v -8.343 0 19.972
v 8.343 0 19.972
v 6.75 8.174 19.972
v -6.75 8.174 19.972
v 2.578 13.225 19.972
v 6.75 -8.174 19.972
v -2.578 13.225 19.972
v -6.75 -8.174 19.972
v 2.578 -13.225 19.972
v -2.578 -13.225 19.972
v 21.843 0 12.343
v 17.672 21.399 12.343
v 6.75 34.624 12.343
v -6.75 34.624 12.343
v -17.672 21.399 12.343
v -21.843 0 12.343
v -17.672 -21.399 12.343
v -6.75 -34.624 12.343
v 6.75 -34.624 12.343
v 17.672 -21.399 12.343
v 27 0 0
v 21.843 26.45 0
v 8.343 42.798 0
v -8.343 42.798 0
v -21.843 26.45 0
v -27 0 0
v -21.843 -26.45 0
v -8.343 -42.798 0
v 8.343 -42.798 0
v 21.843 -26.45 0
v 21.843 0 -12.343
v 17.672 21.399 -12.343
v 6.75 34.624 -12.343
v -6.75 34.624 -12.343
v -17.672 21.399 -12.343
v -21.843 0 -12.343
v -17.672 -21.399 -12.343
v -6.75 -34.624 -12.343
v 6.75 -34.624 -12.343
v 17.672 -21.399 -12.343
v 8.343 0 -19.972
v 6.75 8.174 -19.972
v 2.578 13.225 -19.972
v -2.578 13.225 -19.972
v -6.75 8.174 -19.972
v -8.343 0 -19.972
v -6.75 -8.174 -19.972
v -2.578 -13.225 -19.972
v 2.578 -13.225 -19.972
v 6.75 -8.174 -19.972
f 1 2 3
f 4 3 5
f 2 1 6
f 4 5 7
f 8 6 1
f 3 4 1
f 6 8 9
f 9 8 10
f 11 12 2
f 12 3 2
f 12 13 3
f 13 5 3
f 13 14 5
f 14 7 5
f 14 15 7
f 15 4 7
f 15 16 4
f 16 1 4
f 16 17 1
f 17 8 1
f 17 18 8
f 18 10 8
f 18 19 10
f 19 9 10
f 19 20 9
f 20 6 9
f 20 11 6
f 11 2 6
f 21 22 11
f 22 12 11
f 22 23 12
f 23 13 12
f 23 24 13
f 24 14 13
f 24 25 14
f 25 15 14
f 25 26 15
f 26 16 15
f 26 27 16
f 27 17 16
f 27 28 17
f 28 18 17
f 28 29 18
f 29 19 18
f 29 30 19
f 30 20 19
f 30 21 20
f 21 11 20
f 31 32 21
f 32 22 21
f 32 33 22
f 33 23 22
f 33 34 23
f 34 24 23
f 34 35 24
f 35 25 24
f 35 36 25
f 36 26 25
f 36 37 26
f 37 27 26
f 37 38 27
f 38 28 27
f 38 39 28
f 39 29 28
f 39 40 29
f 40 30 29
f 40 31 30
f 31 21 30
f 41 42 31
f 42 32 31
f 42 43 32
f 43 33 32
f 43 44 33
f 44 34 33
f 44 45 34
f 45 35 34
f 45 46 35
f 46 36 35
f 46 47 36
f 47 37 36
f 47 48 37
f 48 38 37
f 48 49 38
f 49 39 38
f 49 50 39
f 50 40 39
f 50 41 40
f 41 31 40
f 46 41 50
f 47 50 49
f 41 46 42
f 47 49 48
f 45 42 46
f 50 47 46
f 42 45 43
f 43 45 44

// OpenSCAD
// Generated by SolidPython 1.0.1 on 2020-07-29 00:46:49


scale(v = [9, 15, 7]) {
	sphere(r = 3);
}
/***********************************************
*********      SolidPython code:      **********
************************************************
 
# import packages: SolidPython
from solid import *
from solid.utils import *
from itertools import chain, combinations, permutations


class Resize:

    def __init__(self, scad_file):
        self.scad_file = scad_file
        #self.scad_file = import_scad(scad_file)
        # cone/cylinder param:
        self.r1 = 0
        self.r2 = 0
        self.h = 0
        # rectangular prism param:
        self.w = 0
        self.l = 0
        # ellipse param:
        self.r = 0

    # import OpenScad code (file name corresponds to shape)


    # classify shape + parameters
    def assign(self, param1, param2, param3):
        if self.scad_file == 'cone.scad':
            self.r1 = param1
            self.r2 = param2
            self.h = param3
        elif self.scad_file == 'cylinder.scad':
            self.r1 = param1
            self.r2 = param2
            self.h = param3
        elif self.scad_file == 'rectangularPrism.scad':
            self.h = param1
            self.l = param2
            self.w = param3
        else:
            self.r = param1
            self.h = param2

    # resize parameters
    def iterate(self):
        x = range(3, 20, 2)
        i = 1
        if self.scad_file == 'cone.scad':
            tempList = list(permutations(x, 2))
            for temp in tempList:
                param1 = temp[0]
                param2 = temp[1]
                filepath = 'produced_scad_files/' + 'cone' + str(param1) + '_' + str(param2) + '_' + '.scad'
                scad_render_to_file(cylinder(h=param1, r1=param2, r2=0), filepath)

        elif self.scad_file == 'cylinder.scad':
            tempList = list(permutations(x, 3))
            for temp in tempList:
                param1 = temp[0]
                param2 = temp[1]
                filepath = 'produced_scad_files/' + 'cylinder' + str(param1) + '_' + str(param2) + '_' + '.scad'
                scad_render_to_file(cylinder(h=param1, r1=param2, r2=param2), filepath)

        elif self.scad_file == 'rectangularPrism.scad':
            tempList = list(permutations(x, 3))
            for temp in tempList:
                param1 = temp[0]
                param2 = temp[1]
                param3 = temp[2]
                filepath = 'produced_scad_files/' + 'rectangularPrism' + str(param1) + '_' + str(param2) + '_' + str(
                    param3) + '.scad'
                scad_render_to_file(cube(size=(param1, param2, param3)), filepath)

        elif self.scad_file == 'ellipse.scad':
            tempList = list(permutations(x, 4))
            for temp in tempList:
                param1 = temp[0]
                param2 = temp[1]
                param3 = temp[2]
                param4 = temp[3]
                filepath = 'produced_scad_files/' + 'ellipse' + str(param1) + '_' + str(param2) + '_' + str(param3) + '_' + str(param4) + '.scad'
                scad_render_to_file(scale([param1, param2, param3])(sphere(r=param4)), filepath)

    def render_to_scadfile(self):
        scad_render_to_file(scad, 'example.scad') 
 
************************************************/
